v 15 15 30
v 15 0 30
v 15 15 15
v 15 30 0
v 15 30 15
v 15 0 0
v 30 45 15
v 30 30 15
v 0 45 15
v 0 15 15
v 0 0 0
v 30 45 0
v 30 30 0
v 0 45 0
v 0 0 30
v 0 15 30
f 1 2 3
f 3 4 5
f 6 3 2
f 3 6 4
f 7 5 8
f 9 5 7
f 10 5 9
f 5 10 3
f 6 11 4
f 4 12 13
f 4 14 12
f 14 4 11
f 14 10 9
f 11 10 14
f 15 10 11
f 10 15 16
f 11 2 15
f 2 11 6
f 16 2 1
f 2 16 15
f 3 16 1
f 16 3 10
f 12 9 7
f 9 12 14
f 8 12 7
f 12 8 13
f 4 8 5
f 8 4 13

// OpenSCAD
// Fongo piece 11: End hook. GPL-3.0; see README.txt.
// All cube positions derive from the canonical catalogue. z points up.
unit = 15; // mm, scale all pieces AND cards together
positions = [[0,0,0],[0,0,1],[0,1,0],[0,2,0],[1,2,0]];
union() { for (p = positions) translate(p * unit) cube([unit, unit, unit]); }
